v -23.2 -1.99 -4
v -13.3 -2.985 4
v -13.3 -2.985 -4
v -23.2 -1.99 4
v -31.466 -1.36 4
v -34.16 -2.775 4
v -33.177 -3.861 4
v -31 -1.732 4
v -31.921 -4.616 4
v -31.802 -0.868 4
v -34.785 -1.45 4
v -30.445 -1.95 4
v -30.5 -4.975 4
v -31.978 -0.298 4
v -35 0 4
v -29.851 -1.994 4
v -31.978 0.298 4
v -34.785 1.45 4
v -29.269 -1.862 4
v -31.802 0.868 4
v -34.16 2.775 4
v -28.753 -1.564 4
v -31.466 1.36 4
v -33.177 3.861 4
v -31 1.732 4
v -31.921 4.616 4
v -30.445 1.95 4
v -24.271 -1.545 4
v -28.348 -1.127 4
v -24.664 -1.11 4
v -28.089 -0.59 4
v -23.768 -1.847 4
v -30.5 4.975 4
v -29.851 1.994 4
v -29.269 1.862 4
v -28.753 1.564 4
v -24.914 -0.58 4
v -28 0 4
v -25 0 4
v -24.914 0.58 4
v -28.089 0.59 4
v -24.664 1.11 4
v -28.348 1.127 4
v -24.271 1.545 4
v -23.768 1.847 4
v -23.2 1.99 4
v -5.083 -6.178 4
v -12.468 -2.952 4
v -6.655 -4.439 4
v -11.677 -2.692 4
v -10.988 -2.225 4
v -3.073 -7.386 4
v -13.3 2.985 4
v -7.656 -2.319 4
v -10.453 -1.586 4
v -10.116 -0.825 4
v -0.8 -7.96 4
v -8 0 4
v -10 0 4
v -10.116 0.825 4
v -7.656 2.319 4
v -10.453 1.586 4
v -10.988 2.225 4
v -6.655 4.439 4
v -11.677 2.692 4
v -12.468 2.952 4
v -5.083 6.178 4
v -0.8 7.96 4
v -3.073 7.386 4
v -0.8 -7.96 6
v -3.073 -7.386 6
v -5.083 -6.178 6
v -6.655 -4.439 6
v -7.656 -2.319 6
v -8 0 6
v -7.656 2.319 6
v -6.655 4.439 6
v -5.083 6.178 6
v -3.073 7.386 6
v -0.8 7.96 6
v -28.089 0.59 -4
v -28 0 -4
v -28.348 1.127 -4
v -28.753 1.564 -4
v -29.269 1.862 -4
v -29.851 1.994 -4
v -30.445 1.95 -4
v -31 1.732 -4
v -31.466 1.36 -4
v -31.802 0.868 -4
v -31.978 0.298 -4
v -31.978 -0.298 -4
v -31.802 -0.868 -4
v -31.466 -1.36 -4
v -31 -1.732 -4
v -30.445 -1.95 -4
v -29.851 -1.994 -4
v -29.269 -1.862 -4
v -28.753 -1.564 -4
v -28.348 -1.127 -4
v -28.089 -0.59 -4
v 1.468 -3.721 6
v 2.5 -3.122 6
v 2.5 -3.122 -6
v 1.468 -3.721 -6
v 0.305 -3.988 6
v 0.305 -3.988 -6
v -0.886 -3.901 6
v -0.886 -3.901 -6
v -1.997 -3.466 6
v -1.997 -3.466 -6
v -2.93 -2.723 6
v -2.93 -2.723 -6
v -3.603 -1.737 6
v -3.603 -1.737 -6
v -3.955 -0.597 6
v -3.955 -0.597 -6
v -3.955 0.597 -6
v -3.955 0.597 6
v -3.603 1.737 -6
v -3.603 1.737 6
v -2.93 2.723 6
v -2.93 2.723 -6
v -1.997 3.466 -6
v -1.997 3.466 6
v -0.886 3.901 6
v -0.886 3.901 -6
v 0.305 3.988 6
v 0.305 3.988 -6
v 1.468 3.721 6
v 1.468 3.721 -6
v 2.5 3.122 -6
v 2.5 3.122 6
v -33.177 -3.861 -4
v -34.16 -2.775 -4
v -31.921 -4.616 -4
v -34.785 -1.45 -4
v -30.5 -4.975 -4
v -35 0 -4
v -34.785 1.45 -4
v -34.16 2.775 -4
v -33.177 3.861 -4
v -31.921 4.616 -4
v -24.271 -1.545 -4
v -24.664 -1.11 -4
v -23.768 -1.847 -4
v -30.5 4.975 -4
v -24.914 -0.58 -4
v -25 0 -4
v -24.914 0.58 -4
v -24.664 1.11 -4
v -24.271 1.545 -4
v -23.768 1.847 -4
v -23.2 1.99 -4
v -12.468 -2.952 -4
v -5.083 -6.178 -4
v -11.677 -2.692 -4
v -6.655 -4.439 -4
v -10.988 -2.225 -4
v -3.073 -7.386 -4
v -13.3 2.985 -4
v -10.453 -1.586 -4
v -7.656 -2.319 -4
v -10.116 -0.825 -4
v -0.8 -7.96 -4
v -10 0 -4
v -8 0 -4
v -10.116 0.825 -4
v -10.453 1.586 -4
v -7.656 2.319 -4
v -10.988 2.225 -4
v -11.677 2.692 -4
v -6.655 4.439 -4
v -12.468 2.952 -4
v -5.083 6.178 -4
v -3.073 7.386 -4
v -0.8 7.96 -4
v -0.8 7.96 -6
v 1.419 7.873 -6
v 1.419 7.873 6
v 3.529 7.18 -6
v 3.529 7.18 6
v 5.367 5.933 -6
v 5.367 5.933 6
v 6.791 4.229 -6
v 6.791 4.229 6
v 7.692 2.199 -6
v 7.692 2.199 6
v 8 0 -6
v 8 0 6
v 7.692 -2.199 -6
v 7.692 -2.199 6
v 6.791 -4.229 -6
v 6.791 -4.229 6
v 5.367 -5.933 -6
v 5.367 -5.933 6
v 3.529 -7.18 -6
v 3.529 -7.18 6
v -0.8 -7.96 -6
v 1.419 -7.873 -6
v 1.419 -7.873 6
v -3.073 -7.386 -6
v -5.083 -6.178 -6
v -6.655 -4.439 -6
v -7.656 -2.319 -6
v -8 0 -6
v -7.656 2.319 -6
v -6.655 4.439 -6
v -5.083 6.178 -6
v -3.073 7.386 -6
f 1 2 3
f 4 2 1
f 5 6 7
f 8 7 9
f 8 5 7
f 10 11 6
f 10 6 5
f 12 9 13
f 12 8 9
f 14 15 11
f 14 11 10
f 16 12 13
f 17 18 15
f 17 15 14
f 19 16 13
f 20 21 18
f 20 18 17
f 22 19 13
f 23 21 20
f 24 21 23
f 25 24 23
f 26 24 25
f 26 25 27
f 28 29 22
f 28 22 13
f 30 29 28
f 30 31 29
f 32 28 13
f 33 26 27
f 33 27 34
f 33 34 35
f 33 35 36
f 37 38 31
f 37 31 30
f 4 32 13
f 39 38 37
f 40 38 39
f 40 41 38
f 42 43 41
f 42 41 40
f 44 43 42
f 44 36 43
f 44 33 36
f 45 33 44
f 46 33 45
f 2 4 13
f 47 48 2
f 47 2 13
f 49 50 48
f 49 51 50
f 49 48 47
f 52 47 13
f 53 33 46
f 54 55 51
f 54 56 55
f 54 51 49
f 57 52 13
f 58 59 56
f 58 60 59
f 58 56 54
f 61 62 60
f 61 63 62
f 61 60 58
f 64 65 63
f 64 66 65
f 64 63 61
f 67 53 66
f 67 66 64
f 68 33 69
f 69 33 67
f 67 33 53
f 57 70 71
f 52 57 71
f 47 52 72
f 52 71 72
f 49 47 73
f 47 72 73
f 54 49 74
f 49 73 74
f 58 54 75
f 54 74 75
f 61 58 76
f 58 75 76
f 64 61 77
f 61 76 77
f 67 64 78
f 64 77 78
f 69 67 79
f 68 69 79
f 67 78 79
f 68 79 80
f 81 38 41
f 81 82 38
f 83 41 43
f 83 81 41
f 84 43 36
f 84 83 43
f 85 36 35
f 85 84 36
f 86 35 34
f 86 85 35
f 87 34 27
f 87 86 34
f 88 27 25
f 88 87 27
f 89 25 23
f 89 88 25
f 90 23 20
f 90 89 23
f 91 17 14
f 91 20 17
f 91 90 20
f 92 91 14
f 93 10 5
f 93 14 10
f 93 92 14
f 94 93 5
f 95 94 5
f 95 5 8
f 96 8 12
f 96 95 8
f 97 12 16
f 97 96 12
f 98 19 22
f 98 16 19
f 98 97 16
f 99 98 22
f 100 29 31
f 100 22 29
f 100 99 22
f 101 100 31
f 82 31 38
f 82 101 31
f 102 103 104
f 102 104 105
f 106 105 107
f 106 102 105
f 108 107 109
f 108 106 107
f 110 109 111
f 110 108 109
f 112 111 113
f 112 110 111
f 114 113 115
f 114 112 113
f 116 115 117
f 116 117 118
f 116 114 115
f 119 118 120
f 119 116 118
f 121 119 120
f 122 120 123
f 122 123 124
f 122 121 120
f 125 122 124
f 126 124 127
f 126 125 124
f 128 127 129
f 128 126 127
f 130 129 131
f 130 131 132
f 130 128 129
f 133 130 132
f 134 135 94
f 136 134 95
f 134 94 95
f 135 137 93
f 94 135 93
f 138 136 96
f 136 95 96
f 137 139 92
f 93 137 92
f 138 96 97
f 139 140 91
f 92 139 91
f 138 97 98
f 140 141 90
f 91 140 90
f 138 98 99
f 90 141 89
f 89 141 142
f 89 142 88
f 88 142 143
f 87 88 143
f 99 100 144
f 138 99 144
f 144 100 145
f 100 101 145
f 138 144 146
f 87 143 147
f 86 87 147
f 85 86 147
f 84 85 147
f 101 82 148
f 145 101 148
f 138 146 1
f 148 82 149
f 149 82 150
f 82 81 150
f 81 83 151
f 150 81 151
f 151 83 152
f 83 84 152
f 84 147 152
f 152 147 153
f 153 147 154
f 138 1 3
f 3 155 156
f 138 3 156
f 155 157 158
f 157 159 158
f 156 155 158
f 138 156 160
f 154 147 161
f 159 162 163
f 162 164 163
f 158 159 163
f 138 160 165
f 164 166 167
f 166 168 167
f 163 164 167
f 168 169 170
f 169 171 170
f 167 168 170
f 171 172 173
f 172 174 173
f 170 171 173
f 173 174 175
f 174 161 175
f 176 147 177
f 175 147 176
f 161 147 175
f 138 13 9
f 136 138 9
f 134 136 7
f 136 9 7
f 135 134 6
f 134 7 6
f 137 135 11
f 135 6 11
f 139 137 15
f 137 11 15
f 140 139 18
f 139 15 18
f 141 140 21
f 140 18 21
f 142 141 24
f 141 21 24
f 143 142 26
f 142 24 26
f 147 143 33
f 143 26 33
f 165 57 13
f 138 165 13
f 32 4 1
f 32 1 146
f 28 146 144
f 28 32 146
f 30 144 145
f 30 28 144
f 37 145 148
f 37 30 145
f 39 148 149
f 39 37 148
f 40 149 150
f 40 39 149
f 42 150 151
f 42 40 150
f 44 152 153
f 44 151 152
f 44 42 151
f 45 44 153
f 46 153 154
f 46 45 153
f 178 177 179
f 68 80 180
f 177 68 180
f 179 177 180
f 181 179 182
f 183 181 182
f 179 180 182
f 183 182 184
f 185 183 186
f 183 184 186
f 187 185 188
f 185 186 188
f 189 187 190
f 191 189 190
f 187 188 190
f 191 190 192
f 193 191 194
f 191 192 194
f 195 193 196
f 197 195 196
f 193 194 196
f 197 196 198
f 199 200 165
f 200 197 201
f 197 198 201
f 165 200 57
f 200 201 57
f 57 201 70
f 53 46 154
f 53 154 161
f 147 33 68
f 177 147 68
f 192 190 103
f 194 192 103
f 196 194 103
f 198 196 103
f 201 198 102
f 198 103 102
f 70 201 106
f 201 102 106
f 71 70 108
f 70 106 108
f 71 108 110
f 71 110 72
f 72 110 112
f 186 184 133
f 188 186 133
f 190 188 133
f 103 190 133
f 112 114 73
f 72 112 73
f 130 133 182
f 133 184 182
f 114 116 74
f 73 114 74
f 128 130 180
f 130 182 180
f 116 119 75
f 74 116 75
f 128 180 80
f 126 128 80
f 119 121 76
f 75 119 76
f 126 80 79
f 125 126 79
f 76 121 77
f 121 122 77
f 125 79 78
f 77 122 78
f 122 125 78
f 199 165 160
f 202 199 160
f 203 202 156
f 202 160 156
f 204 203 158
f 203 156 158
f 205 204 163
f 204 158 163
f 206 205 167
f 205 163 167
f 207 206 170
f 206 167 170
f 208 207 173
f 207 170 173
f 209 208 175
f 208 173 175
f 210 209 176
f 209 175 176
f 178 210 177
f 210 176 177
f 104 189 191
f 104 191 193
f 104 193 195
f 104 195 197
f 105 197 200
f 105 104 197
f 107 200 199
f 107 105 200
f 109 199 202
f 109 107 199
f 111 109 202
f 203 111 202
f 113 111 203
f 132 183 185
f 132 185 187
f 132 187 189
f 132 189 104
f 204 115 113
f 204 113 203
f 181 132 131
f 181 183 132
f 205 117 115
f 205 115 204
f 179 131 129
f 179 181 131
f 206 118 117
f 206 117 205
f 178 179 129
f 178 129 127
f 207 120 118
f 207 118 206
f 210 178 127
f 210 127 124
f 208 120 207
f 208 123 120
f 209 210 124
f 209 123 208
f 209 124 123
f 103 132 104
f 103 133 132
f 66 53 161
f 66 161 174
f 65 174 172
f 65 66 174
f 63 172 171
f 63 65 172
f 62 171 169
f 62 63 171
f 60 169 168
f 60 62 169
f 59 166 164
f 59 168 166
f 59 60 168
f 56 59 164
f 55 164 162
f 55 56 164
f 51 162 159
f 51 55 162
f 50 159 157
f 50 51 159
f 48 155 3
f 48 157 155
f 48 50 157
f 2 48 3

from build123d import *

# Parameters (mm, degrees)
SKETCH_1_R          = 2
EXTRUDE_1_DEPTH     = 6
CUT_EXTRUDE_START   = -4
CUT_EXTRUDE_2_DEPTH = 2
CUT_EXTRUDE_START_2 = 6
CUT_EXTRUDE_3_DEPTH = 2


with BuildPart() as part:
    # 草图1 → 凸台-拉伸1 (new, symmetric)
    with BuildSketch(Plane.XY):
        with BuildLine():
            Line((-30.5, 4.974937186), (-0.8, 7.959899497))
            ThreePointArc((-0.8, 7.959899497), (8, 0), (-0.8, -7.959899497))
            Line((-0.8, -7.959899497), (-30.5, -4.974937186))
            ThreePointArc((-30.5, -4.974937186), (-35, 0), (-30.5, 4.974937186))
        make_face()
        with Locations((-30, 0)):
            Circle(SKETCH_1_R, mode=Mode.SUBTRACT)
        with BuildLine():
            Line((-23.2, 1.989974874), (-13.3, 2.984962311))
            ThreePointArc((-13.3, 2.984962311), (-10, 0), (-13.3, -2.984962311))
            Line((-13.3, -2.984962311), (-23.2, -1.989974874))
            ThreePointArc((-23.2, -1.989974874), (-25, 0), (-23.2, 1.989974874))
        make_face(mode=Mode.SUBTRACT)
        with BuildLine():
            Line((2.5, 3.122498999), (2.5, -3.122498999))
            ThreePointArc((2.5, -3.122498999), (-4, 0), (2.5, 3.122498999))
        make_face(mode=Mode.SUBTRACT)
    extrude(amount=EXTRUDE_1_DEPTH, both=True)

    # 草图2 → 切除-拉伸2 (cut)
    with BuildSketch(Plane.XY.offset(CUT_EXTRUDE_START)):
        with BuildLine():
            Line((-30.5, -4.974937186), (-0.8, -7.959899497))
            ThreePointArc((-0.8, -7.959899497), (-8, 0), (-0.8, 7.959899497))
            Line((-0.8, 7.959899497), (-30.5, 4.974937186))
            ThreePointArc((-30.5, 4.974937186), (-35, 0), (-30.5, -4.974937186))
        make_face()
    extrude(amount=-CUT_EXTRUDE_2_DEPTH, mode=Mode.SUBTRACT)

    # 草图2<2> → 切除-拉伸3 (cut)
    with BuildSketch(Plane.XY.offset(CUT_EXTRUDE_START_2)):
        with BuildLine():
            Line((-30.5, -4.974937186), (-0.8, -7.959899497))
            ThreePointArc((-0.8, -7.959899497), (-8, 0), (-0.8, 7.959899497))
            Line((-0.8, 7.959899497), (-30.5, 4.974937186))
            ThreePointArc((-30.5, 4.974937186), (-35, 0), (-30.5, -4.974937186))
        make_face()
    extrude(amount=-CUT_EXTRUDE_3_DEPTH, mode=Mode.SUBTRACT)


solid = part.part
